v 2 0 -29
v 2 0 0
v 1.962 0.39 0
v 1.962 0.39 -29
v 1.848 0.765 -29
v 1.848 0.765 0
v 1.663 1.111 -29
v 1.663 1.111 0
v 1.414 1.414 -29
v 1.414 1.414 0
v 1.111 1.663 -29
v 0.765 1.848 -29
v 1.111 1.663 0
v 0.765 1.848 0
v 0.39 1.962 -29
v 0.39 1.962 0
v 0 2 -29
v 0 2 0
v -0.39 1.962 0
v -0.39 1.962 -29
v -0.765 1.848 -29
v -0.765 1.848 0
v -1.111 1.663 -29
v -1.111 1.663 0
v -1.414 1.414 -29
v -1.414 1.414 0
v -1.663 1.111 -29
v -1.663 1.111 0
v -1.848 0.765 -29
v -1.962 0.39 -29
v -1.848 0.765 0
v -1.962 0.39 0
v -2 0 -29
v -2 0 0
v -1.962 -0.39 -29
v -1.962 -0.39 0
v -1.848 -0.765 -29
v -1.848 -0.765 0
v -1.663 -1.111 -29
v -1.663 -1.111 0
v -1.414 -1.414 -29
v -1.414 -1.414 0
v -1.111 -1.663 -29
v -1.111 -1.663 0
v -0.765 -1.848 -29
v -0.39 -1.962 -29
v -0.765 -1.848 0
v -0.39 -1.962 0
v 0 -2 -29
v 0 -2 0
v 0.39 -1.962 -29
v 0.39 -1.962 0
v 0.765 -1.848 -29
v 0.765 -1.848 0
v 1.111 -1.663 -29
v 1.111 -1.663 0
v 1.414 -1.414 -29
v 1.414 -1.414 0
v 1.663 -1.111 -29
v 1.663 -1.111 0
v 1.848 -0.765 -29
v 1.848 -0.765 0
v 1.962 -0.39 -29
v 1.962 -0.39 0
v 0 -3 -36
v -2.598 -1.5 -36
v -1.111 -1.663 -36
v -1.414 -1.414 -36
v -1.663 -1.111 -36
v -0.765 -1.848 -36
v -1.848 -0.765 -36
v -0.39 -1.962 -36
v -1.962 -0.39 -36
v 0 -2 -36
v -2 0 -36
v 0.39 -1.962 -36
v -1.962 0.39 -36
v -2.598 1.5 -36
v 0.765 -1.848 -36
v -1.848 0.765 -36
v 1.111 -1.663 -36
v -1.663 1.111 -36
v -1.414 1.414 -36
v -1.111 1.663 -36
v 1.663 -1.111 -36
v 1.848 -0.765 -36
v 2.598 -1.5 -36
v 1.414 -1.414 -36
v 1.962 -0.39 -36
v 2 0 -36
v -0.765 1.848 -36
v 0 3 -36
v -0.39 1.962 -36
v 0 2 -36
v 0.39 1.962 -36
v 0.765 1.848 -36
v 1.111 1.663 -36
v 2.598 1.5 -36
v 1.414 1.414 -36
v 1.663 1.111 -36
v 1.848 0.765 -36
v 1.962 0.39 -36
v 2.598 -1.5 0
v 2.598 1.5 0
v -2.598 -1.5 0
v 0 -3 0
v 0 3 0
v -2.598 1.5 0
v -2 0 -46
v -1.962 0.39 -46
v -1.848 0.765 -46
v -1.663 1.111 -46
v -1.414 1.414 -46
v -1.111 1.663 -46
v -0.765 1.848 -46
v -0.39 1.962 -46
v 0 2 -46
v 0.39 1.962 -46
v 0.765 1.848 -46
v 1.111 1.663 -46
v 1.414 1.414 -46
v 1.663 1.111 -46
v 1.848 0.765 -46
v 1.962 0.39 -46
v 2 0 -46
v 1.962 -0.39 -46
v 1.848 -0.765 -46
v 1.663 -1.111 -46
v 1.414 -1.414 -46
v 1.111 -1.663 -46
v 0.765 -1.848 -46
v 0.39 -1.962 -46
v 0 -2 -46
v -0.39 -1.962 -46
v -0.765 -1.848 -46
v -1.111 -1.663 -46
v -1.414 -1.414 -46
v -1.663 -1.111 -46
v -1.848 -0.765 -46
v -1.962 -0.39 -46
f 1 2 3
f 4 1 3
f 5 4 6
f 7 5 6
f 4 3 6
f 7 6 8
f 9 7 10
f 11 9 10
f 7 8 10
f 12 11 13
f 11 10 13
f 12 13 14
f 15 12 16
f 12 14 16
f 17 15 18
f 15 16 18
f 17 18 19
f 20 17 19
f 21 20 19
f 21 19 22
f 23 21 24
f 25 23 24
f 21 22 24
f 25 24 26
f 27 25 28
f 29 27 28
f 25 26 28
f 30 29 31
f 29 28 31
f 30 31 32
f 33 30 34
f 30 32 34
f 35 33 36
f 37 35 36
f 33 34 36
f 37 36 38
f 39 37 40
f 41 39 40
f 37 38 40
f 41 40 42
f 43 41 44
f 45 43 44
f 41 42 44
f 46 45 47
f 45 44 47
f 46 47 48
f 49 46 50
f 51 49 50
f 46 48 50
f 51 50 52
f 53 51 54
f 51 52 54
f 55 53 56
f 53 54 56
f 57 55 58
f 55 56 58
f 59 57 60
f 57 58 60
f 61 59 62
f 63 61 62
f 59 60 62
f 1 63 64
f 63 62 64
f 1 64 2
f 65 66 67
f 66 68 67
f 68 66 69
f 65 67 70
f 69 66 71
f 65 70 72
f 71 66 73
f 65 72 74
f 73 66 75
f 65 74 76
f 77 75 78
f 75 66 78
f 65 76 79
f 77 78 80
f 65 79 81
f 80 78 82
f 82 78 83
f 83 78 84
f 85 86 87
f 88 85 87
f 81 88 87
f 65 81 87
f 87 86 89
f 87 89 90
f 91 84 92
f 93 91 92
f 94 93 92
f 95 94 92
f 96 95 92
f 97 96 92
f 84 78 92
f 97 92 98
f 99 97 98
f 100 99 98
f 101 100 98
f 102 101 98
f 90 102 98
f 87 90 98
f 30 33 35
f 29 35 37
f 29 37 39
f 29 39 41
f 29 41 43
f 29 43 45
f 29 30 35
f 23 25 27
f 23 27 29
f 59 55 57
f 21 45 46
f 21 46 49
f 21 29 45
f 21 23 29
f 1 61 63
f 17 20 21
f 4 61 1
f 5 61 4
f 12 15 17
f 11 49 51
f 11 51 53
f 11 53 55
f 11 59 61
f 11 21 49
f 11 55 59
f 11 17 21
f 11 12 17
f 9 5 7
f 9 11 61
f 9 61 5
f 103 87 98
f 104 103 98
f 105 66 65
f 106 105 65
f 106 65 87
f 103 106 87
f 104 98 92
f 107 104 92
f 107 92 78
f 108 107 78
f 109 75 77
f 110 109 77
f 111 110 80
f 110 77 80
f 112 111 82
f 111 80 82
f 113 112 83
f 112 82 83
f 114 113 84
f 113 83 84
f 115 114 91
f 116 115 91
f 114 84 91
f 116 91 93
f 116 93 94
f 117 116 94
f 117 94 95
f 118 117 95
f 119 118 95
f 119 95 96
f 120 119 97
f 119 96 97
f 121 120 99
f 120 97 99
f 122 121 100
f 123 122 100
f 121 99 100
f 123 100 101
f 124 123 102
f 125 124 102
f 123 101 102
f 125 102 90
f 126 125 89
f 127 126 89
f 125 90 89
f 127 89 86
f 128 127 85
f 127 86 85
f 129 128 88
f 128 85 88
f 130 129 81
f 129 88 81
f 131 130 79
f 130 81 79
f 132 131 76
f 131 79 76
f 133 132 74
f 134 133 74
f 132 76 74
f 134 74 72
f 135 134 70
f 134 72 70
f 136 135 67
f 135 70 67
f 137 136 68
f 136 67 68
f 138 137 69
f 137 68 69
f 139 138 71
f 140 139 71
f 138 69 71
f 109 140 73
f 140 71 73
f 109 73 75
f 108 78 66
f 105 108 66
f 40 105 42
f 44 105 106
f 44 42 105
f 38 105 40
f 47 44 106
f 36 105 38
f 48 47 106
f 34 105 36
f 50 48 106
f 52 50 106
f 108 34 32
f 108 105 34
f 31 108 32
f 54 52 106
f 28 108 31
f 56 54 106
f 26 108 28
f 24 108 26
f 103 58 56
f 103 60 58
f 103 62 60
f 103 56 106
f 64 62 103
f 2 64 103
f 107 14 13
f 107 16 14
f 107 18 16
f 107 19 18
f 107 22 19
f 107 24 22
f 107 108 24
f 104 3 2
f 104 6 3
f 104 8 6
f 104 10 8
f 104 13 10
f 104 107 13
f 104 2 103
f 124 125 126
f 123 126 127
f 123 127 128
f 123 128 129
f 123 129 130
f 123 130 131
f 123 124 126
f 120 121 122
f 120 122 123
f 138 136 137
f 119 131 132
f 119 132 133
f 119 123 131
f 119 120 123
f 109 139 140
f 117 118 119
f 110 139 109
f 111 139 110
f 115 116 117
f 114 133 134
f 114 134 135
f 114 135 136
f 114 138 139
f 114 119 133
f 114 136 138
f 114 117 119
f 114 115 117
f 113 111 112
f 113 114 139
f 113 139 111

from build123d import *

# Parameters (mm, degrees)
BOSS_EXTRUDE1_DEPTH = 36
SKETCH2_R           = 2
CUT_EXTRUDE1_DEPTH  = 29
SKETCH3_R           = 2
BOSS_EXTRUDE2_DEPTH = 10


with BuildPart() as part:
    # Sketch1 → Boss-Extrude1 (new body)
    with BuildSketch(Plane.XY):
        Polygon((2.598076211, -1.5), (2.598076211, 1.5), (0, 3), (-2.598076211, 1.5), (-2.598076211, -1.5), (0, -3), align=None)
    extrude(amount=-BOSS_EXTRUDE1_DEPTH)

    # Sketch2 → Cut-Extrude1 (cut)
    with BuildSketch(Plane.XY):
        Circle(SKETCH2_R)
    extrude(amount=-CUT_EXTRUDE1_DEPTH, mode=Mode.SUBTRACT)

    # Sketch3 → Boss-Extrude2 (add)
    with BuildSketch(Plane(origin=(0, 0, -36), x_dir=(-1, 0, 0), z_dir=(0, 0, -1))):
        Circle(SKETCH3_R)
    extrude(amount=BOSS_EXTRUDE2_DEPTH)


solid = part.part
